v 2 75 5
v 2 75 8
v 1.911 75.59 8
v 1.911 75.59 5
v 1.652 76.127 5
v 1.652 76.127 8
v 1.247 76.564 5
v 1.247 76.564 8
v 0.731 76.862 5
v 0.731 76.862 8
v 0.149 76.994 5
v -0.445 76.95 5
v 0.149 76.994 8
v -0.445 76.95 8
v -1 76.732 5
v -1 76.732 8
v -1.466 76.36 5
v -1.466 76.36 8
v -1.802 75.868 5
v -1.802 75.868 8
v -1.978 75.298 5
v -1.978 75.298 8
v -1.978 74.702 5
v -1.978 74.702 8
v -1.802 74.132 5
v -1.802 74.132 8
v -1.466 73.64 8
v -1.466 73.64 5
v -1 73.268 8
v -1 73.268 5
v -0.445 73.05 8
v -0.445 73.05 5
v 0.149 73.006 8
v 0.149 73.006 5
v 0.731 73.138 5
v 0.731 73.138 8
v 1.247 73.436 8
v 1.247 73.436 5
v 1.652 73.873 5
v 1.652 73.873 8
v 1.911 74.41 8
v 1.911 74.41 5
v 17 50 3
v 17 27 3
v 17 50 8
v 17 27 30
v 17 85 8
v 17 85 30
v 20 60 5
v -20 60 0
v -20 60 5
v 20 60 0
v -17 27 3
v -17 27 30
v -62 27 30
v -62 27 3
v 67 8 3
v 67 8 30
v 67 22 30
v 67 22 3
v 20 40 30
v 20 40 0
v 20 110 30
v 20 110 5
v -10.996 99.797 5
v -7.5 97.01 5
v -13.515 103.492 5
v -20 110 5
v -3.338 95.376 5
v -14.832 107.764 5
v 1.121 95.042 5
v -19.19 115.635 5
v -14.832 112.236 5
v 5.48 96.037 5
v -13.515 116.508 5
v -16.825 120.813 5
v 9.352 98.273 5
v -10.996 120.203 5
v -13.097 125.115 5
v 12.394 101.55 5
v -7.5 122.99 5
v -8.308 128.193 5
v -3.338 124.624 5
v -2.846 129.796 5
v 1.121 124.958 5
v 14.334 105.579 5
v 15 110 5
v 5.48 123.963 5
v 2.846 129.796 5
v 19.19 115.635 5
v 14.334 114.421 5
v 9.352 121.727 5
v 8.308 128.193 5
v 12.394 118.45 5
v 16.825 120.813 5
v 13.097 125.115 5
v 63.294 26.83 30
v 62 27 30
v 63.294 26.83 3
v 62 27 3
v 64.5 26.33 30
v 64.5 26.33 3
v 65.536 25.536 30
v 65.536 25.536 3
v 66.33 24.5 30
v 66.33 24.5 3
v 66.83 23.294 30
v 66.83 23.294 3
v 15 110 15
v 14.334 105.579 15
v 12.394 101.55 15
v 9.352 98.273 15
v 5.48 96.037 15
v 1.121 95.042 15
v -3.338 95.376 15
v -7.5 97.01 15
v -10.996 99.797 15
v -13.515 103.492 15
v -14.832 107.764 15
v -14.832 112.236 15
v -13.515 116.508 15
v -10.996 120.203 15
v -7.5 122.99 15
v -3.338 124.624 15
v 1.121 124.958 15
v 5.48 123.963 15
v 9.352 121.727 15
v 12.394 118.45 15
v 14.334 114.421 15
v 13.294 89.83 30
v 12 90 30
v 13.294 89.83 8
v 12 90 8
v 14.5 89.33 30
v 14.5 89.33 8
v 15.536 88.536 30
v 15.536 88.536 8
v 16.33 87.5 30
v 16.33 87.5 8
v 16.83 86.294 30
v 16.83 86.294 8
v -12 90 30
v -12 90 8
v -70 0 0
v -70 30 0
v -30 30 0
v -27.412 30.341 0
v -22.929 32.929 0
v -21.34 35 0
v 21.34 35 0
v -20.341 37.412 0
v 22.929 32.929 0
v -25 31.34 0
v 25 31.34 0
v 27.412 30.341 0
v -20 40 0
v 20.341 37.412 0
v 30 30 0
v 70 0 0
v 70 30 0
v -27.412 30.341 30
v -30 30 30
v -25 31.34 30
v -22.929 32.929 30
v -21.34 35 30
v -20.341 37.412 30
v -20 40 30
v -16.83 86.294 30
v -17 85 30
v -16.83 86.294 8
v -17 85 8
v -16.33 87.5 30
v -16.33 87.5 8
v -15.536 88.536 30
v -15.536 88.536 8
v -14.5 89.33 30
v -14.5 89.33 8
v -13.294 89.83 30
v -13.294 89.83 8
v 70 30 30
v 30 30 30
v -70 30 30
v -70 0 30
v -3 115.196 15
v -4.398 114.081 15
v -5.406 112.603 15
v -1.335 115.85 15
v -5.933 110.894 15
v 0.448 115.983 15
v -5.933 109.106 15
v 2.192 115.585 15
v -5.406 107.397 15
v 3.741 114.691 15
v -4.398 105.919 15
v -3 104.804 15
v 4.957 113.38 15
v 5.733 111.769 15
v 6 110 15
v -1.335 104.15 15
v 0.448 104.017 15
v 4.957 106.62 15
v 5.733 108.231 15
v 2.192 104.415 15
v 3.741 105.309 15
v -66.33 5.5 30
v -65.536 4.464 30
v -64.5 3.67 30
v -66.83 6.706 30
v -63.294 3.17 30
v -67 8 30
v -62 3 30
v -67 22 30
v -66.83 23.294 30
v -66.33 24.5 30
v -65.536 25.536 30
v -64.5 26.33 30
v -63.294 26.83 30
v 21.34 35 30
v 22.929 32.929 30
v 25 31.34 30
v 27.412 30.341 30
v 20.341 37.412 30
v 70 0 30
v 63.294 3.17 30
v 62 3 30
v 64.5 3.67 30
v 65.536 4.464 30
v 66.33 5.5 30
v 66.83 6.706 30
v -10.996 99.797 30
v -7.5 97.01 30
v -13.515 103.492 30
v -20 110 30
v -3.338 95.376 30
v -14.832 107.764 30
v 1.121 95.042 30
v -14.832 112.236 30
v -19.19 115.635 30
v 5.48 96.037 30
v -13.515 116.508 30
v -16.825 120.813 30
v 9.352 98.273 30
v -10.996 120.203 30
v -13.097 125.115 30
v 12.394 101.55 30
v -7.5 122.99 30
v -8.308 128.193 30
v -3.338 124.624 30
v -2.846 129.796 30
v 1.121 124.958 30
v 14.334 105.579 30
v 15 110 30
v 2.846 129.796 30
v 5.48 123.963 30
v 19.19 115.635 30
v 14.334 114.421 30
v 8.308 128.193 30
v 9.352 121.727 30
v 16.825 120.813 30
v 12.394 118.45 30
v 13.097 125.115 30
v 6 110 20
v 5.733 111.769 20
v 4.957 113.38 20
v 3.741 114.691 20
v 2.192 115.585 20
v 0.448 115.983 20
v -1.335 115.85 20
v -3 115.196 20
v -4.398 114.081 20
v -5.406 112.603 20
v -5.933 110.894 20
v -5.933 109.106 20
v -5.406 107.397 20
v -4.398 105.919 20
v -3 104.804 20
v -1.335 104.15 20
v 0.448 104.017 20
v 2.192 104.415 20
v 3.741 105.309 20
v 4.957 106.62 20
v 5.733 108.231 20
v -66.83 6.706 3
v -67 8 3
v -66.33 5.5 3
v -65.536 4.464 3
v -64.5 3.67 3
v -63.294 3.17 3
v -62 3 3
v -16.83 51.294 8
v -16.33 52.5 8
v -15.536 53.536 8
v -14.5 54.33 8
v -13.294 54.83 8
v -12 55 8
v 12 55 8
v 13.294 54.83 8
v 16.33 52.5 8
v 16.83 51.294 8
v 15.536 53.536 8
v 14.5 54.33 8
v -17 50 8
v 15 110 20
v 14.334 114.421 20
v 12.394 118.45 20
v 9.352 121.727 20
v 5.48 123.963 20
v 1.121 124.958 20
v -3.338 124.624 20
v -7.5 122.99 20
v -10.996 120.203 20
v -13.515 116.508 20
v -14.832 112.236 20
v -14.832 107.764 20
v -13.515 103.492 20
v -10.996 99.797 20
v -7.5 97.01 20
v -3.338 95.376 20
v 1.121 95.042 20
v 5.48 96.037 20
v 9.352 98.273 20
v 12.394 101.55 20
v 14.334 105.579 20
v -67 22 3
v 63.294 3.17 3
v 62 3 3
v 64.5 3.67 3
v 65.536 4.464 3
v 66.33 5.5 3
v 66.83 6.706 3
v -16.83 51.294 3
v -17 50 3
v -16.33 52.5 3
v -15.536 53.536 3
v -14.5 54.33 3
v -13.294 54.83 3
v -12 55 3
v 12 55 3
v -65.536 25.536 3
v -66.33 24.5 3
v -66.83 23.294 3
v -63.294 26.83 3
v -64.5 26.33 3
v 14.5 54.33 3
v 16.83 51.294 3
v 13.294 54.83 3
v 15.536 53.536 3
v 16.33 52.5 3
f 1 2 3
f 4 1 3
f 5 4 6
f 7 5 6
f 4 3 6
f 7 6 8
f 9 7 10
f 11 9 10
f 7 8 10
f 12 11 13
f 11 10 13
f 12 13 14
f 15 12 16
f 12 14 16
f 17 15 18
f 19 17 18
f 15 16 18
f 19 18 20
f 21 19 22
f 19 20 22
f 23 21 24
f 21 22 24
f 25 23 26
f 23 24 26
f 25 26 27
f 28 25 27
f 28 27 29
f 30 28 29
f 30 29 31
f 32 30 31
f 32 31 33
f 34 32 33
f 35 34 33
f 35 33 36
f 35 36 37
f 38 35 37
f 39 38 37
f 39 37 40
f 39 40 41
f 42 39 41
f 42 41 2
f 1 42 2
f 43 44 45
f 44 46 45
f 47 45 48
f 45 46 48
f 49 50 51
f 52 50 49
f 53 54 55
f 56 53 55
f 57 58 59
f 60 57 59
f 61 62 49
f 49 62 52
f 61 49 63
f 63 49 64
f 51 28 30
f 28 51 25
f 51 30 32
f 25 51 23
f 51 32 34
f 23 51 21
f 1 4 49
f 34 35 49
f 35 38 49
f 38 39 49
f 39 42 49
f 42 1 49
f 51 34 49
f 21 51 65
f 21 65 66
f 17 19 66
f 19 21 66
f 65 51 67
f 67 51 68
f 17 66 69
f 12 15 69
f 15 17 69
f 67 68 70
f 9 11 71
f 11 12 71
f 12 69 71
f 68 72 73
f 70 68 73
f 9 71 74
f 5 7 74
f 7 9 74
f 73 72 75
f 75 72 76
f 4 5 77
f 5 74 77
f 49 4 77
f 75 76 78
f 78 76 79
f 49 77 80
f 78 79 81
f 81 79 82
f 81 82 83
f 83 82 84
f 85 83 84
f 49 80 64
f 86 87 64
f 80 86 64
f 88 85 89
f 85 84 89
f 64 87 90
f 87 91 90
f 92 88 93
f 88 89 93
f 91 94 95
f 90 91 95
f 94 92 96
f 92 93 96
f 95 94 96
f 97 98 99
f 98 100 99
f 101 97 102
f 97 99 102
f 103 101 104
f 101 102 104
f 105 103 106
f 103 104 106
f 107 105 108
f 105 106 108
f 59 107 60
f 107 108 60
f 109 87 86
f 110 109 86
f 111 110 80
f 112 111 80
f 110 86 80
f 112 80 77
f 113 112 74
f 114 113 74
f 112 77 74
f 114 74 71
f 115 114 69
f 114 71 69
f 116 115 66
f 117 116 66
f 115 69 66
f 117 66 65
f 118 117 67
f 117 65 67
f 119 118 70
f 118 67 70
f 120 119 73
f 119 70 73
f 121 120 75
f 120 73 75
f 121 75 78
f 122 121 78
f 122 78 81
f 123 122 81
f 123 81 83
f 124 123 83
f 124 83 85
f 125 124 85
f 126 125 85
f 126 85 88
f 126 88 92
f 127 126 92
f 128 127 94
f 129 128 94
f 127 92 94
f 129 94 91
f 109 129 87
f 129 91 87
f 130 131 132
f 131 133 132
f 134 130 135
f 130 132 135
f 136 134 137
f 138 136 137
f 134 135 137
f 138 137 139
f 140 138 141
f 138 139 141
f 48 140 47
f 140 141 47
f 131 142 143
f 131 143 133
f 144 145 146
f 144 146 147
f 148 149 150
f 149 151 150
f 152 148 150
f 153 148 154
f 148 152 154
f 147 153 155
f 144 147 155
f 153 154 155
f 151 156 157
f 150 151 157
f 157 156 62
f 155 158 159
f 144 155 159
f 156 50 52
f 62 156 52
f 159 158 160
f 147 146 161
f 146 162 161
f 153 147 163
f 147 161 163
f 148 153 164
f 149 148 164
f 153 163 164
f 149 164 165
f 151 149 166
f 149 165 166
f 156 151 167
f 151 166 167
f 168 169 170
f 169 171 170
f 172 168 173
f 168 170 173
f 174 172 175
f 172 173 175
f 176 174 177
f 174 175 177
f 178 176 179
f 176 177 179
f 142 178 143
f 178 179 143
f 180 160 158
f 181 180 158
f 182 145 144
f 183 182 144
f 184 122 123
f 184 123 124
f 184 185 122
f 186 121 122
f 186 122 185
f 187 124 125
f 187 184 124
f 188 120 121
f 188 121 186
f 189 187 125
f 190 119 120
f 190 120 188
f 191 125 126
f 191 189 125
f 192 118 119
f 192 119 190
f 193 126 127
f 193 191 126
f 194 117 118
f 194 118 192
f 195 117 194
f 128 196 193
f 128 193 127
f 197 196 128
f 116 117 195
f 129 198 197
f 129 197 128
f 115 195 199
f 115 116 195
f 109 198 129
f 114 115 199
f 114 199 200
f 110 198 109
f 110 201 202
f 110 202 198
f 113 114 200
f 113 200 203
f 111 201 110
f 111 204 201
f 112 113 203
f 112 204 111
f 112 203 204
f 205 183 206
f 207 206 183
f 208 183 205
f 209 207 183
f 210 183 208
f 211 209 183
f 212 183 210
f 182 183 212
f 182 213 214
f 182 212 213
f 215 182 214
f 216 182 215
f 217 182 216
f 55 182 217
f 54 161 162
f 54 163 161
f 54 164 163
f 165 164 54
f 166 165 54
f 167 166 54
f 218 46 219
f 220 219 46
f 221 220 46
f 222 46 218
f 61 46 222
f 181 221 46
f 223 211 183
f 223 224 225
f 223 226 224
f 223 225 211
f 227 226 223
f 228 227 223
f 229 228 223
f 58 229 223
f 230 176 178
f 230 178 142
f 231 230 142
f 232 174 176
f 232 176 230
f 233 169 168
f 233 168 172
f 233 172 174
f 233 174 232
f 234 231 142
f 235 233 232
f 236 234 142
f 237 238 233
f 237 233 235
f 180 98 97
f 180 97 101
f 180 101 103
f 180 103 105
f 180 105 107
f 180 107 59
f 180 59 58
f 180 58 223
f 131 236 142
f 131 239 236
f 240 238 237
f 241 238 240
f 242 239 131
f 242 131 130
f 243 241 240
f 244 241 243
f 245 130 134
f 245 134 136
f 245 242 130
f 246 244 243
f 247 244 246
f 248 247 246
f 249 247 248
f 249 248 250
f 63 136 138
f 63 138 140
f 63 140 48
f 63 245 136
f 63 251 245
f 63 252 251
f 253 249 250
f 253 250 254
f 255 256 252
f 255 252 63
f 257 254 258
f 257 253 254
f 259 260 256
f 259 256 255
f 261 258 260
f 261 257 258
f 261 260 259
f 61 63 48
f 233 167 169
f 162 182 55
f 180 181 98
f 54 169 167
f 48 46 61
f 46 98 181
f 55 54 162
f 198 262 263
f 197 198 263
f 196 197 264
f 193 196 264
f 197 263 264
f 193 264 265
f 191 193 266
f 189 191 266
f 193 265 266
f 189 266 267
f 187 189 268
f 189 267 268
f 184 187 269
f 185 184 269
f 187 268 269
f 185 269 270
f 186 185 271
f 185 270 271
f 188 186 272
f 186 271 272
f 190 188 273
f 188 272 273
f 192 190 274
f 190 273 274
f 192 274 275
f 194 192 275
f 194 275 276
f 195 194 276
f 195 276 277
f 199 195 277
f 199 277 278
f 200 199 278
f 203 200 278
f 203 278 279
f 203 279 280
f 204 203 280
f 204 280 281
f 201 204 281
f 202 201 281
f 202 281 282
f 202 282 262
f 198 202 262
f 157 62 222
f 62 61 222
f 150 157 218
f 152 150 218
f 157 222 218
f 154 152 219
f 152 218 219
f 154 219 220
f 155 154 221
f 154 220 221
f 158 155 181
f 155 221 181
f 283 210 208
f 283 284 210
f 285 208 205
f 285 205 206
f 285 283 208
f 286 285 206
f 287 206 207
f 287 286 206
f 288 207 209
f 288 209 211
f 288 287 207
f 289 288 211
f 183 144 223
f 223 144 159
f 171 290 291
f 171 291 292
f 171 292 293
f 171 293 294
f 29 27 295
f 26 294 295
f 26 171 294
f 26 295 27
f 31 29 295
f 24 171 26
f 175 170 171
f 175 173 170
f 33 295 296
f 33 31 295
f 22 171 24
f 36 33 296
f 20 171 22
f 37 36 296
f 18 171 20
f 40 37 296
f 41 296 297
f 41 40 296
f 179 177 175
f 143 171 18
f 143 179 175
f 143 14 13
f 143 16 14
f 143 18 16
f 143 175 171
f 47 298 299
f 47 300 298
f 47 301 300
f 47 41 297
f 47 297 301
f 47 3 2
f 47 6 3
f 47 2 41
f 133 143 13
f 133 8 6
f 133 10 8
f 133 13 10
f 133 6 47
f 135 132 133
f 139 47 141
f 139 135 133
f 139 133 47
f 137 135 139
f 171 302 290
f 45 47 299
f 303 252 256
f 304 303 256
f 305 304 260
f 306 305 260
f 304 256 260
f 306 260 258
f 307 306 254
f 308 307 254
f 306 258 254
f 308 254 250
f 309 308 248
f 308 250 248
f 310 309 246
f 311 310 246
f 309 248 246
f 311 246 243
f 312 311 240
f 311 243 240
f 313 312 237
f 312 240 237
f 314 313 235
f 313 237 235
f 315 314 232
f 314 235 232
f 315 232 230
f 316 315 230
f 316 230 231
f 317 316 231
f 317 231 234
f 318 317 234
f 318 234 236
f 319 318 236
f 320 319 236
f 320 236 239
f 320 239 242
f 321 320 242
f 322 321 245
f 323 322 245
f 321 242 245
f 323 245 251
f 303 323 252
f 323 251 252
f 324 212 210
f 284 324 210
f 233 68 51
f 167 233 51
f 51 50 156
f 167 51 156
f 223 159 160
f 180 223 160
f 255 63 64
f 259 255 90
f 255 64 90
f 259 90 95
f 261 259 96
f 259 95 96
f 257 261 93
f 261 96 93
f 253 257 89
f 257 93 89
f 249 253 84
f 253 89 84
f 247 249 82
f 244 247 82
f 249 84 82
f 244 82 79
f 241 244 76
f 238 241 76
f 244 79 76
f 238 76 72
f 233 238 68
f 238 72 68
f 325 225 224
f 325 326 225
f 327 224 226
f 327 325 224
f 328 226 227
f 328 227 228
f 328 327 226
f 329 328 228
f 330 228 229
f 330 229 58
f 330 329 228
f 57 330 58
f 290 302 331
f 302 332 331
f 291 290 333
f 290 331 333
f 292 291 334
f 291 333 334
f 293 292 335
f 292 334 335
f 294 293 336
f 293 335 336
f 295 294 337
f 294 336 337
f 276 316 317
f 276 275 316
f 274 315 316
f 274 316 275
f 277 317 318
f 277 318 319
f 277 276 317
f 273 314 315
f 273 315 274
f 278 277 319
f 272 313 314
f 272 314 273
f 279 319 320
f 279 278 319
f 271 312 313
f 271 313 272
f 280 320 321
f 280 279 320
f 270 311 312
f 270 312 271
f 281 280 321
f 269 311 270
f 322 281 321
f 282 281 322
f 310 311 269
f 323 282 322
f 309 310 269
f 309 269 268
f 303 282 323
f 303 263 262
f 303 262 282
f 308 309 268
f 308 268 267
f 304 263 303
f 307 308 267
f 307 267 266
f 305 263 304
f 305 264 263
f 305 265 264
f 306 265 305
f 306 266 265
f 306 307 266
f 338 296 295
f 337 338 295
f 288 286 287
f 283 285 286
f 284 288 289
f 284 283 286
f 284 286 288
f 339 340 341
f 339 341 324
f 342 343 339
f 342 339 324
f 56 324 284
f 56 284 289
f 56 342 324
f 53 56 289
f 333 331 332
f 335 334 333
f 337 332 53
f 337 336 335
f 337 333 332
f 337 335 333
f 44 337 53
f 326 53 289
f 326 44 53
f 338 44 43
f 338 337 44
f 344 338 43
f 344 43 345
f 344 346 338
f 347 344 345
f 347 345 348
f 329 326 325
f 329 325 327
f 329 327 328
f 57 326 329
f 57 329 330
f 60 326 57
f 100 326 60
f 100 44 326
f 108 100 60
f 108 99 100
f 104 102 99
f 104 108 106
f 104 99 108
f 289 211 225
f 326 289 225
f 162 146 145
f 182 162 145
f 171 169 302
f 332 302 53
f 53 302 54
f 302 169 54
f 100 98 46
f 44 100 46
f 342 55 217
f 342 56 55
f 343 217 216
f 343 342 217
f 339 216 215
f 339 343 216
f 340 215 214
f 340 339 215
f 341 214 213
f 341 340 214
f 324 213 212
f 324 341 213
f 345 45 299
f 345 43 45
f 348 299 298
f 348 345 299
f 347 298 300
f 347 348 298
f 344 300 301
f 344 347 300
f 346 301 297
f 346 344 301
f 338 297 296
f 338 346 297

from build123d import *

# Parameters (mm, degrees)
F1_DEPTH  = 30
F2_W      = 40
F2_H      = 70
F3_DEPTH  = 5
F5_DEPTH  = 27
F6_W      = 34
F6_H      = 35
F7_DEPTH  = 22
F8_R      = 15
F9_DEPTH  = 10
F10_R     = 6
F11_DEPTH = 30.001
F12_R     = 10
F13_R     = 5
F14_R     = 15
F15_DEPTH = 10
F16_R     = 2
F17_DEPTH = 8.001


with BuildPart() as f1:
    # F0 (on Top) → F1 (new body)
    with BuildSketch(Plane.XY):
        with BuildLine():
            Line((20, 30), (20, 110))
            ThreePointArc((20, 110), (0, 130), (-20, 110))
            Line((-20, 110), (-20, 30))
            Line((-20, 30), (-70, 30))
            Line((-70, 30), (-70, 0))
            Line((-70, 0), (70, 0))
            Line((70, 0), (70, 30))
            Line((70, 30), (20, 30))
        make_face()
    extrude(amount=F1_DEPTH)

    # F2 (on face) → F3 (cut)
    with BuildSketch(Plane.XY):
        with Locations((0, 95)):
            Rectangle(F2_W, F2_H)
    extrude(amount=F3_DEPTH, mode=Mode.SUBTRACT)

    # F4 (on face) → F5 (cut)
    with BuildSketch(Plane.XY.offset(30)):
        Polygon((-17, 55), (-17, 27), (-67, 27), (-67, 3), (67, 3), (67, 27), (17, 27), (17, 55), align=None)
    extrude(amount=-F5_DEPTH, mode=Mode.SUBTRACT)

    # F6 (on face) → F7 (cut)
    with BuildSketch(Plane.XY.offset(30)):
        with Locations((0, 72.5)):
            Rectangle(F6_W, F6_H)
    extrude(amount=-F7_DEPTH, mode=Mode.SUBTRACT)

    # F8 (on face) → F9 (cut)
    with BuildSketch(Plane.XY.offset(30)):
        with Locations((0, 110)):
            Circle(F8_R)
    extrude(amount=-F9_DEPTH, mode=Mode.SUBTRACT)

    # F10 (on face) → F11 (cut, through all)
    with BuildSketch(Plane.XY.offset(30)):
        with Locations((0, 110)):
            Circle(F10_R)
    extrude(amount=-F11_DEPTH, mode=Mode.SUBTRACT)

    # F12
    f12_edges = [f1.edges().sort_by_distance(p)[0] for p in [
        (20, 30, 15),
        (-20, 30, 15),
    ]]
    fillet(f12_edges, radius=F12_R)

    # F13
    f13_edges = [f1.edges().sort_by_distance(p)[0] for p in [
        (-17, 90, 19),
        (-67, 27, 16.5),
        (17, 90, 19),
        (67, 27, 16.5),
        (-67, 3, 16.5),
        (67, 3, 16.5),
        (-17, 55, 5.5),
        (17, 55, 5.5),
    ]]
    fillet(f13_edges, radius=F13_R)

    # F14 (on face) → F15 (cut)
    with BuildSketch(Plane(origin=(0, 0, 5), x_dir=(1, 0, 0), z_dir=(0, 0, -1))):
        with Locations((0, -110)):
            Circle(F14_R)
    extrude(amount=-F15_DEPTH, mode=Mode.SUBTRACT)

    # F16 (on face) → F17 (cut, through all)
    with BuildSketch(Plane.XY.offset(8)):
        with Locations((0, 75)):
            Circle(F16_R)
    extrude(amount=-F17_DEPTH, mode=Mode.SUBTRACT)


solid = f1.part
